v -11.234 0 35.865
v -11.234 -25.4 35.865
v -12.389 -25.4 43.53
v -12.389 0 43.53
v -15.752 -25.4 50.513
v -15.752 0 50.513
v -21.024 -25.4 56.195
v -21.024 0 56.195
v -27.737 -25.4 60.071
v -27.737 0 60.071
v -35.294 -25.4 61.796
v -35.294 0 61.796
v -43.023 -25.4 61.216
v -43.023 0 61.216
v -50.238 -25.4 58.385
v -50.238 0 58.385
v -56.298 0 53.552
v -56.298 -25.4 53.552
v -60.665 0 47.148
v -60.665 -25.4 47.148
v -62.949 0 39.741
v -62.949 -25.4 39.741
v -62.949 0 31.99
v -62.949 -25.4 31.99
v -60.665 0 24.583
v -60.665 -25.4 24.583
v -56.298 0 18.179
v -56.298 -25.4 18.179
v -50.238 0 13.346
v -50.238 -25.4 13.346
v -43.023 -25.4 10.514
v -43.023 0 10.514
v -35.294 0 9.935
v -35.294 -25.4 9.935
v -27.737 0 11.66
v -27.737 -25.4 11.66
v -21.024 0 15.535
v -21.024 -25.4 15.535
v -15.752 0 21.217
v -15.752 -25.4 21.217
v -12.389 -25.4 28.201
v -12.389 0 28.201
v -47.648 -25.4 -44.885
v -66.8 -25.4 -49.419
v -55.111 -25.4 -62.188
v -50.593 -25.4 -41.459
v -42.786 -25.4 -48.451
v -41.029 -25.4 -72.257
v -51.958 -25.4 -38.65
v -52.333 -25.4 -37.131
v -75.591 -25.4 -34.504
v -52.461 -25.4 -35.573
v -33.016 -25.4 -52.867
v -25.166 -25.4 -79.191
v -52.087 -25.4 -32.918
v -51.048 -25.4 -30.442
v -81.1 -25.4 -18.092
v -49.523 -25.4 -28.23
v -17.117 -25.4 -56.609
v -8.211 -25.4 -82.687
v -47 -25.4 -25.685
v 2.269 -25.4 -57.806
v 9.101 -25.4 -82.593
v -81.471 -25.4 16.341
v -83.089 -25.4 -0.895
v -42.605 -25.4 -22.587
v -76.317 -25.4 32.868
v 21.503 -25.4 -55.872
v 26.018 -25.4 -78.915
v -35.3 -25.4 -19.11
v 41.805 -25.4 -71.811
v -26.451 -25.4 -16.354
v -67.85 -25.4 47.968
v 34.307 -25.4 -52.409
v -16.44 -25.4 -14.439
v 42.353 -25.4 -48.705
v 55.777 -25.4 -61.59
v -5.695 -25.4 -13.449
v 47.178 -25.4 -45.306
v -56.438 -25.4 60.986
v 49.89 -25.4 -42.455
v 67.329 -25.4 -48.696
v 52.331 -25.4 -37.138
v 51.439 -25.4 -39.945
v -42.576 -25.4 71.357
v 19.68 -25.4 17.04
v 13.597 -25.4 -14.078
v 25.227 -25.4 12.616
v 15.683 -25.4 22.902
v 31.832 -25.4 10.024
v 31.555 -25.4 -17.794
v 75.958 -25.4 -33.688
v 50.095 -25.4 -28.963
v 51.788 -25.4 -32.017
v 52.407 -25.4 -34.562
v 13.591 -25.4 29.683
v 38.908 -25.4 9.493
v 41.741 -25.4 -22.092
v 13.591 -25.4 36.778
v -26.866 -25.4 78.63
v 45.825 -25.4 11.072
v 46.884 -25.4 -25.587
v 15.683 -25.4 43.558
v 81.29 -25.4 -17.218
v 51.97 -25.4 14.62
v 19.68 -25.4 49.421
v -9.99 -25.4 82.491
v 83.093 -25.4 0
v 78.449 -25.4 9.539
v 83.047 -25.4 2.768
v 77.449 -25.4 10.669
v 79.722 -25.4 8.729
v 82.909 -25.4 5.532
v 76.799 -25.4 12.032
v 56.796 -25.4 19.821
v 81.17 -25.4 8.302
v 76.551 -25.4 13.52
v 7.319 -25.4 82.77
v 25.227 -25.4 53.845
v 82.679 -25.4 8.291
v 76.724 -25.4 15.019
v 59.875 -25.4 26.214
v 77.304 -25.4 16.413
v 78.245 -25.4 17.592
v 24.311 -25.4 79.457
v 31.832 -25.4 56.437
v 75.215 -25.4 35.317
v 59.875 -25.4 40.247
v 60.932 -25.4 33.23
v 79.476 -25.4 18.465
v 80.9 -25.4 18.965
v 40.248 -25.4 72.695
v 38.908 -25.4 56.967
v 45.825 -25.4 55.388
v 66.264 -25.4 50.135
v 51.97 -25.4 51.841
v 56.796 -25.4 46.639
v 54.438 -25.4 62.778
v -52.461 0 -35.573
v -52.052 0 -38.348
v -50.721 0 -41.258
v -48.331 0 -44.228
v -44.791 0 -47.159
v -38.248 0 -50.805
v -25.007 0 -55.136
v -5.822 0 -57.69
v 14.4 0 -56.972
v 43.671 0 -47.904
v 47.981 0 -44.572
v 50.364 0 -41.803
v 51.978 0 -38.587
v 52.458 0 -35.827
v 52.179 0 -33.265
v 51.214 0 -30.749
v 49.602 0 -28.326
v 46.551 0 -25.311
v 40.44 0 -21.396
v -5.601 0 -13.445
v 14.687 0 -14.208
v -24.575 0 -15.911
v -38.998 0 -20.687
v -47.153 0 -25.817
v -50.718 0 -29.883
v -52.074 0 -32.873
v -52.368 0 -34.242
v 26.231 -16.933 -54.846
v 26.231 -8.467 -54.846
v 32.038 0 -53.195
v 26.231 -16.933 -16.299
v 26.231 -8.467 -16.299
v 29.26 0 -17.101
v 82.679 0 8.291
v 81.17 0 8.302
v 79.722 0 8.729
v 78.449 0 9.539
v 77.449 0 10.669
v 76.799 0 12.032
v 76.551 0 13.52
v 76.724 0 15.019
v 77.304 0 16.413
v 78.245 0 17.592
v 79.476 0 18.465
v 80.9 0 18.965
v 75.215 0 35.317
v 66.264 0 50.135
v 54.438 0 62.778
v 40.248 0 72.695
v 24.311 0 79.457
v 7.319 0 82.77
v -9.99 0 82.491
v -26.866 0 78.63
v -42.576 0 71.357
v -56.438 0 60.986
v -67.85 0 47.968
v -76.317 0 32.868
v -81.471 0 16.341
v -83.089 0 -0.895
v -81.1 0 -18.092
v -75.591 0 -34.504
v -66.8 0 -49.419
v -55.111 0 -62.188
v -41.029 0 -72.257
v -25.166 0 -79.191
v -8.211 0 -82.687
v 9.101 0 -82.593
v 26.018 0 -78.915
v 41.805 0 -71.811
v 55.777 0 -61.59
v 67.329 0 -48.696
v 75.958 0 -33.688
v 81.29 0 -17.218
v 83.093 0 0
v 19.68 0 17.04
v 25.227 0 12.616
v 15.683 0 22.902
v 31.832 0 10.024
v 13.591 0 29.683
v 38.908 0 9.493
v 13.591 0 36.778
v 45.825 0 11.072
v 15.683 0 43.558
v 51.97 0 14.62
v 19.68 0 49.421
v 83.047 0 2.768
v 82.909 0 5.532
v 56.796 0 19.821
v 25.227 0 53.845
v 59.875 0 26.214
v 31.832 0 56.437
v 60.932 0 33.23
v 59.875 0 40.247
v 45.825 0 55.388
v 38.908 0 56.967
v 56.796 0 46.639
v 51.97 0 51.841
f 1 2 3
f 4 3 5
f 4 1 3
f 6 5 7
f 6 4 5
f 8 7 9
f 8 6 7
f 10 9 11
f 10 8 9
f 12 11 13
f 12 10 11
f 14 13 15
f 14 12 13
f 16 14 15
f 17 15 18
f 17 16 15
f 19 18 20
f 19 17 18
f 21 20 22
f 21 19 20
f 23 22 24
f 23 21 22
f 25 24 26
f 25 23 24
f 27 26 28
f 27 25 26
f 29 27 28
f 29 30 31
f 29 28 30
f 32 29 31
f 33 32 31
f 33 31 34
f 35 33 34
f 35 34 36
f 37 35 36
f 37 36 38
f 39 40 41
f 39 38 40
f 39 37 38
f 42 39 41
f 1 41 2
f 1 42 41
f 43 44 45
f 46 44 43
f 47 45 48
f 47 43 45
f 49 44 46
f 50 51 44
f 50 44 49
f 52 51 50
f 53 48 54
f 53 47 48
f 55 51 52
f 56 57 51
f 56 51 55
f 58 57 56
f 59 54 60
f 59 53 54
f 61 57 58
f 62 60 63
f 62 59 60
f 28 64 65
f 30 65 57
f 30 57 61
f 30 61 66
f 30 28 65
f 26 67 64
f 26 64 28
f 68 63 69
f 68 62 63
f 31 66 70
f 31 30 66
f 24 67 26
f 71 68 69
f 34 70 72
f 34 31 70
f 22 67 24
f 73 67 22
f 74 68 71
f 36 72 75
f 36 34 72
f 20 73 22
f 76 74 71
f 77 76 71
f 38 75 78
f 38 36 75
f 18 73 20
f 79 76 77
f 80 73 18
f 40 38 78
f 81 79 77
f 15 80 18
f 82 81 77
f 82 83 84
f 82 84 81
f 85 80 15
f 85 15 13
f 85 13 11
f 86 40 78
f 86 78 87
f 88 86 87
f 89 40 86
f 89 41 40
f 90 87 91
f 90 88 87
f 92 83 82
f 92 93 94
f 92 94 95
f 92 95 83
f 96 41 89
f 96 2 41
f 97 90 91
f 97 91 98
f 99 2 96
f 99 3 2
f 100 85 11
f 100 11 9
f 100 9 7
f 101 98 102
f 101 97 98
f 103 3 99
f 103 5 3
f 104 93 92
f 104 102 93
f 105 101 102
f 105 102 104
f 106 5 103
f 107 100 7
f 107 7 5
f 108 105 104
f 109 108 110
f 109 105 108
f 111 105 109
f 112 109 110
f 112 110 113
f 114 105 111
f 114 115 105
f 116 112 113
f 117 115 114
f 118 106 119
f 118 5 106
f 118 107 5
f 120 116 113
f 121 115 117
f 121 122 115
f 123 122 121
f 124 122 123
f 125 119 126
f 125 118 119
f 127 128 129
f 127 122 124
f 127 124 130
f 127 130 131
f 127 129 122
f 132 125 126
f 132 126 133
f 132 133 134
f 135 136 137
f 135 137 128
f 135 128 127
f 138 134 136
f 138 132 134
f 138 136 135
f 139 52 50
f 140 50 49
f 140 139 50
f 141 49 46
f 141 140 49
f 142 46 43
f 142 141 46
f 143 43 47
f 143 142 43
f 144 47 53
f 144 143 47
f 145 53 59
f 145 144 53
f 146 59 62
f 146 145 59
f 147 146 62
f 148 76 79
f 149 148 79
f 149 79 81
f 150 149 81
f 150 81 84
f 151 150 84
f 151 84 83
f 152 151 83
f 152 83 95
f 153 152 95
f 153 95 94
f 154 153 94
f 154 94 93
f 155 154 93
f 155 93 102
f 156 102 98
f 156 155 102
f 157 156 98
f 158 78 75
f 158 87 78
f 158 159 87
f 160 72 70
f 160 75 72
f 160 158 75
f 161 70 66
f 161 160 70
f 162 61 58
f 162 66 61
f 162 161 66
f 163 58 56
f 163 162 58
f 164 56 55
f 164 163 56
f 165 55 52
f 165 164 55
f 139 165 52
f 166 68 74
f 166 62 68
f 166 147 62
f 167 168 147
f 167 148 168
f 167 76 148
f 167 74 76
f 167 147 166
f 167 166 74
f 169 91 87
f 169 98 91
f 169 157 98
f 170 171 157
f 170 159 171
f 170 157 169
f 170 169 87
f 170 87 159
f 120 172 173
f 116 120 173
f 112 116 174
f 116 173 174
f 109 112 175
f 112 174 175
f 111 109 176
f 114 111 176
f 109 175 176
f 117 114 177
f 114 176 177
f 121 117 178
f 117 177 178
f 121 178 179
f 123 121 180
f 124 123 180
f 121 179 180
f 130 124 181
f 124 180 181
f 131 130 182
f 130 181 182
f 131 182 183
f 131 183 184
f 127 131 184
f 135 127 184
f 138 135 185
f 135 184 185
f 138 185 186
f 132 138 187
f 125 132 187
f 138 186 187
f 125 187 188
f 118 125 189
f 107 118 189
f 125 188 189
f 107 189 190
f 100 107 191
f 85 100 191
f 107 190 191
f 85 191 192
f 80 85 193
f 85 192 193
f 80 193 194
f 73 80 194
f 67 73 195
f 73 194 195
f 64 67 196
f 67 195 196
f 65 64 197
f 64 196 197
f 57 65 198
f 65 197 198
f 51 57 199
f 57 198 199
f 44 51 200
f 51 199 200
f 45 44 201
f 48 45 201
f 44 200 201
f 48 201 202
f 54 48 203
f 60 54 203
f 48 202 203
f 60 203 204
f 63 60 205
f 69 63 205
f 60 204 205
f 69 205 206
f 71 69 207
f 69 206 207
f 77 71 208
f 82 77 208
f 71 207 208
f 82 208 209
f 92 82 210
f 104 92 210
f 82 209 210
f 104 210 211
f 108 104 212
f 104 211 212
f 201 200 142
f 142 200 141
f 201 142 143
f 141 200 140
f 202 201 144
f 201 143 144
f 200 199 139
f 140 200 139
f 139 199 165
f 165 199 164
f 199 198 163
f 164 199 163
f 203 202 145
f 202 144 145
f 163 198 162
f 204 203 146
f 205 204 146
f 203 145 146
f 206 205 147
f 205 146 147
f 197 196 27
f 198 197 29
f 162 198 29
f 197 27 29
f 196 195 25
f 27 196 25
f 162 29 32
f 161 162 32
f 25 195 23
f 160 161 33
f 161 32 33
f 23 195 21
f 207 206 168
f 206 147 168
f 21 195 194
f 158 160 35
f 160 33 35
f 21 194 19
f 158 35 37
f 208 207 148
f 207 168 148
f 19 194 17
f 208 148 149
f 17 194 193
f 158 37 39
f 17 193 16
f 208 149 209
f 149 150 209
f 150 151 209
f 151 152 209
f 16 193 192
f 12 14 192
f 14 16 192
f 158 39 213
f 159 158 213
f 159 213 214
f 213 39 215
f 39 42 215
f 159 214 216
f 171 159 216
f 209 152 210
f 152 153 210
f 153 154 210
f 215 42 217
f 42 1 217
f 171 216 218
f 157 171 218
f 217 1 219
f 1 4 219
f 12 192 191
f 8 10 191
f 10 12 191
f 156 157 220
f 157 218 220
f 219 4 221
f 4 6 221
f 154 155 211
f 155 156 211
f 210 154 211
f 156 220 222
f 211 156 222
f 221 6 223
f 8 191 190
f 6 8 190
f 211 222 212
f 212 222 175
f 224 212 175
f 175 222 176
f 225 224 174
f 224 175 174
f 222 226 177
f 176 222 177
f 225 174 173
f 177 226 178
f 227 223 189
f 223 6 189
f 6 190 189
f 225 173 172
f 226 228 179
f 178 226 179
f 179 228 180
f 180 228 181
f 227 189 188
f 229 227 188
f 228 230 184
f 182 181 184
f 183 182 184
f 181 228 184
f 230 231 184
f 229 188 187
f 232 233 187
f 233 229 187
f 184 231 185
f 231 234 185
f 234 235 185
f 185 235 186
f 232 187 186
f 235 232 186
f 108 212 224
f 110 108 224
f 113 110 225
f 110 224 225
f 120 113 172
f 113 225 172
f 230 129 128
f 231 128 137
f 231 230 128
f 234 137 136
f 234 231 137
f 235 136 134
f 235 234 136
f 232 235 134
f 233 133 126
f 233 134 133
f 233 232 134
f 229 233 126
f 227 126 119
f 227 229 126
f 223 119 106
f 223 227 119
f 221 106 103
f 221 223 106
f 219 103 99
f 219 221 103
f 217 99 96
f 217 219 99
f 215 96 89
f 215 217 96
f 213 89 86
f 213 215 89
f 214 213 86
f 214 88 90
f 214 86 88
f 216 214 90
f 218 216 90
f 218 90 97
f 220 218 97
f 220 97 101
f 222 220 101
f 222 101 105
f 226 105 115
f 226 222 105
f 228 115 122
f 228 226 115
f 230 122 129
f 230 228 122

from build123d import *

# Parameters (mm, degrees)
F2_DEPTH = 25.4
F1_R     = 23.8034536531
F1_R_2   = 26.0029572039
F3_DEPTH = 51.562


with BuildPart() as f2:
    # F0 (on Front) → F2 (new body)
    with BuildSketch(Plane.XZ):
        with BuildLine():
            ThreePointArc((80.9001052948, 18.9651504489), (-82.5432138965, -9.5457743473), (83.0933449096, 0))
            ThreePointArc((83.0933449096, 0), (82.9896173096, 4.150588761), (82.6786934815, 8.2908149446))
            ThreePointArc((82.6786934815, 8.2908149446), (76.6233510402, 12.7672010059), (80.9001052948, 18.9651504489))
        make_face()
    extrude(amount=F2_DEPTH)

    # F1 (on Front) → F3 (cut)
    with BuildSketch(Plane.XZ):
        with Locations((37.1288508177, 33.230368048)):
            Circle(F1_R)
        with Locations((-37.2369028628, 35.8653739095)):
            Circle(F1_R_2)
        with BuildLine():
            add(Edge.make_bspline(
                [(-52.4613894522, -35.5725958943), (-52.4613894522, -74.1188410816), (26.2306947261, -54.8457184879), (104.9227789044, -35.5725958943), (26.2306947261, -16.2994733007), (-52.4613894522, 2.9736492929), (-52.4613894522, -35.5725958943)],
                knots=[0, 0, 0, 2.0943951024, 2.0943951024, 4.1887902048, 4.1887902048, 6.2831853072, 6.2831853072, 6.2831853072], degree=2, weights=[1, 0.5, 1, 0.5, 1, 0.5, 1]))
        make_face()
    extrude(amount=F3_DEPTH, mode=Mode.SUBTRACT)


solid = f2.part
